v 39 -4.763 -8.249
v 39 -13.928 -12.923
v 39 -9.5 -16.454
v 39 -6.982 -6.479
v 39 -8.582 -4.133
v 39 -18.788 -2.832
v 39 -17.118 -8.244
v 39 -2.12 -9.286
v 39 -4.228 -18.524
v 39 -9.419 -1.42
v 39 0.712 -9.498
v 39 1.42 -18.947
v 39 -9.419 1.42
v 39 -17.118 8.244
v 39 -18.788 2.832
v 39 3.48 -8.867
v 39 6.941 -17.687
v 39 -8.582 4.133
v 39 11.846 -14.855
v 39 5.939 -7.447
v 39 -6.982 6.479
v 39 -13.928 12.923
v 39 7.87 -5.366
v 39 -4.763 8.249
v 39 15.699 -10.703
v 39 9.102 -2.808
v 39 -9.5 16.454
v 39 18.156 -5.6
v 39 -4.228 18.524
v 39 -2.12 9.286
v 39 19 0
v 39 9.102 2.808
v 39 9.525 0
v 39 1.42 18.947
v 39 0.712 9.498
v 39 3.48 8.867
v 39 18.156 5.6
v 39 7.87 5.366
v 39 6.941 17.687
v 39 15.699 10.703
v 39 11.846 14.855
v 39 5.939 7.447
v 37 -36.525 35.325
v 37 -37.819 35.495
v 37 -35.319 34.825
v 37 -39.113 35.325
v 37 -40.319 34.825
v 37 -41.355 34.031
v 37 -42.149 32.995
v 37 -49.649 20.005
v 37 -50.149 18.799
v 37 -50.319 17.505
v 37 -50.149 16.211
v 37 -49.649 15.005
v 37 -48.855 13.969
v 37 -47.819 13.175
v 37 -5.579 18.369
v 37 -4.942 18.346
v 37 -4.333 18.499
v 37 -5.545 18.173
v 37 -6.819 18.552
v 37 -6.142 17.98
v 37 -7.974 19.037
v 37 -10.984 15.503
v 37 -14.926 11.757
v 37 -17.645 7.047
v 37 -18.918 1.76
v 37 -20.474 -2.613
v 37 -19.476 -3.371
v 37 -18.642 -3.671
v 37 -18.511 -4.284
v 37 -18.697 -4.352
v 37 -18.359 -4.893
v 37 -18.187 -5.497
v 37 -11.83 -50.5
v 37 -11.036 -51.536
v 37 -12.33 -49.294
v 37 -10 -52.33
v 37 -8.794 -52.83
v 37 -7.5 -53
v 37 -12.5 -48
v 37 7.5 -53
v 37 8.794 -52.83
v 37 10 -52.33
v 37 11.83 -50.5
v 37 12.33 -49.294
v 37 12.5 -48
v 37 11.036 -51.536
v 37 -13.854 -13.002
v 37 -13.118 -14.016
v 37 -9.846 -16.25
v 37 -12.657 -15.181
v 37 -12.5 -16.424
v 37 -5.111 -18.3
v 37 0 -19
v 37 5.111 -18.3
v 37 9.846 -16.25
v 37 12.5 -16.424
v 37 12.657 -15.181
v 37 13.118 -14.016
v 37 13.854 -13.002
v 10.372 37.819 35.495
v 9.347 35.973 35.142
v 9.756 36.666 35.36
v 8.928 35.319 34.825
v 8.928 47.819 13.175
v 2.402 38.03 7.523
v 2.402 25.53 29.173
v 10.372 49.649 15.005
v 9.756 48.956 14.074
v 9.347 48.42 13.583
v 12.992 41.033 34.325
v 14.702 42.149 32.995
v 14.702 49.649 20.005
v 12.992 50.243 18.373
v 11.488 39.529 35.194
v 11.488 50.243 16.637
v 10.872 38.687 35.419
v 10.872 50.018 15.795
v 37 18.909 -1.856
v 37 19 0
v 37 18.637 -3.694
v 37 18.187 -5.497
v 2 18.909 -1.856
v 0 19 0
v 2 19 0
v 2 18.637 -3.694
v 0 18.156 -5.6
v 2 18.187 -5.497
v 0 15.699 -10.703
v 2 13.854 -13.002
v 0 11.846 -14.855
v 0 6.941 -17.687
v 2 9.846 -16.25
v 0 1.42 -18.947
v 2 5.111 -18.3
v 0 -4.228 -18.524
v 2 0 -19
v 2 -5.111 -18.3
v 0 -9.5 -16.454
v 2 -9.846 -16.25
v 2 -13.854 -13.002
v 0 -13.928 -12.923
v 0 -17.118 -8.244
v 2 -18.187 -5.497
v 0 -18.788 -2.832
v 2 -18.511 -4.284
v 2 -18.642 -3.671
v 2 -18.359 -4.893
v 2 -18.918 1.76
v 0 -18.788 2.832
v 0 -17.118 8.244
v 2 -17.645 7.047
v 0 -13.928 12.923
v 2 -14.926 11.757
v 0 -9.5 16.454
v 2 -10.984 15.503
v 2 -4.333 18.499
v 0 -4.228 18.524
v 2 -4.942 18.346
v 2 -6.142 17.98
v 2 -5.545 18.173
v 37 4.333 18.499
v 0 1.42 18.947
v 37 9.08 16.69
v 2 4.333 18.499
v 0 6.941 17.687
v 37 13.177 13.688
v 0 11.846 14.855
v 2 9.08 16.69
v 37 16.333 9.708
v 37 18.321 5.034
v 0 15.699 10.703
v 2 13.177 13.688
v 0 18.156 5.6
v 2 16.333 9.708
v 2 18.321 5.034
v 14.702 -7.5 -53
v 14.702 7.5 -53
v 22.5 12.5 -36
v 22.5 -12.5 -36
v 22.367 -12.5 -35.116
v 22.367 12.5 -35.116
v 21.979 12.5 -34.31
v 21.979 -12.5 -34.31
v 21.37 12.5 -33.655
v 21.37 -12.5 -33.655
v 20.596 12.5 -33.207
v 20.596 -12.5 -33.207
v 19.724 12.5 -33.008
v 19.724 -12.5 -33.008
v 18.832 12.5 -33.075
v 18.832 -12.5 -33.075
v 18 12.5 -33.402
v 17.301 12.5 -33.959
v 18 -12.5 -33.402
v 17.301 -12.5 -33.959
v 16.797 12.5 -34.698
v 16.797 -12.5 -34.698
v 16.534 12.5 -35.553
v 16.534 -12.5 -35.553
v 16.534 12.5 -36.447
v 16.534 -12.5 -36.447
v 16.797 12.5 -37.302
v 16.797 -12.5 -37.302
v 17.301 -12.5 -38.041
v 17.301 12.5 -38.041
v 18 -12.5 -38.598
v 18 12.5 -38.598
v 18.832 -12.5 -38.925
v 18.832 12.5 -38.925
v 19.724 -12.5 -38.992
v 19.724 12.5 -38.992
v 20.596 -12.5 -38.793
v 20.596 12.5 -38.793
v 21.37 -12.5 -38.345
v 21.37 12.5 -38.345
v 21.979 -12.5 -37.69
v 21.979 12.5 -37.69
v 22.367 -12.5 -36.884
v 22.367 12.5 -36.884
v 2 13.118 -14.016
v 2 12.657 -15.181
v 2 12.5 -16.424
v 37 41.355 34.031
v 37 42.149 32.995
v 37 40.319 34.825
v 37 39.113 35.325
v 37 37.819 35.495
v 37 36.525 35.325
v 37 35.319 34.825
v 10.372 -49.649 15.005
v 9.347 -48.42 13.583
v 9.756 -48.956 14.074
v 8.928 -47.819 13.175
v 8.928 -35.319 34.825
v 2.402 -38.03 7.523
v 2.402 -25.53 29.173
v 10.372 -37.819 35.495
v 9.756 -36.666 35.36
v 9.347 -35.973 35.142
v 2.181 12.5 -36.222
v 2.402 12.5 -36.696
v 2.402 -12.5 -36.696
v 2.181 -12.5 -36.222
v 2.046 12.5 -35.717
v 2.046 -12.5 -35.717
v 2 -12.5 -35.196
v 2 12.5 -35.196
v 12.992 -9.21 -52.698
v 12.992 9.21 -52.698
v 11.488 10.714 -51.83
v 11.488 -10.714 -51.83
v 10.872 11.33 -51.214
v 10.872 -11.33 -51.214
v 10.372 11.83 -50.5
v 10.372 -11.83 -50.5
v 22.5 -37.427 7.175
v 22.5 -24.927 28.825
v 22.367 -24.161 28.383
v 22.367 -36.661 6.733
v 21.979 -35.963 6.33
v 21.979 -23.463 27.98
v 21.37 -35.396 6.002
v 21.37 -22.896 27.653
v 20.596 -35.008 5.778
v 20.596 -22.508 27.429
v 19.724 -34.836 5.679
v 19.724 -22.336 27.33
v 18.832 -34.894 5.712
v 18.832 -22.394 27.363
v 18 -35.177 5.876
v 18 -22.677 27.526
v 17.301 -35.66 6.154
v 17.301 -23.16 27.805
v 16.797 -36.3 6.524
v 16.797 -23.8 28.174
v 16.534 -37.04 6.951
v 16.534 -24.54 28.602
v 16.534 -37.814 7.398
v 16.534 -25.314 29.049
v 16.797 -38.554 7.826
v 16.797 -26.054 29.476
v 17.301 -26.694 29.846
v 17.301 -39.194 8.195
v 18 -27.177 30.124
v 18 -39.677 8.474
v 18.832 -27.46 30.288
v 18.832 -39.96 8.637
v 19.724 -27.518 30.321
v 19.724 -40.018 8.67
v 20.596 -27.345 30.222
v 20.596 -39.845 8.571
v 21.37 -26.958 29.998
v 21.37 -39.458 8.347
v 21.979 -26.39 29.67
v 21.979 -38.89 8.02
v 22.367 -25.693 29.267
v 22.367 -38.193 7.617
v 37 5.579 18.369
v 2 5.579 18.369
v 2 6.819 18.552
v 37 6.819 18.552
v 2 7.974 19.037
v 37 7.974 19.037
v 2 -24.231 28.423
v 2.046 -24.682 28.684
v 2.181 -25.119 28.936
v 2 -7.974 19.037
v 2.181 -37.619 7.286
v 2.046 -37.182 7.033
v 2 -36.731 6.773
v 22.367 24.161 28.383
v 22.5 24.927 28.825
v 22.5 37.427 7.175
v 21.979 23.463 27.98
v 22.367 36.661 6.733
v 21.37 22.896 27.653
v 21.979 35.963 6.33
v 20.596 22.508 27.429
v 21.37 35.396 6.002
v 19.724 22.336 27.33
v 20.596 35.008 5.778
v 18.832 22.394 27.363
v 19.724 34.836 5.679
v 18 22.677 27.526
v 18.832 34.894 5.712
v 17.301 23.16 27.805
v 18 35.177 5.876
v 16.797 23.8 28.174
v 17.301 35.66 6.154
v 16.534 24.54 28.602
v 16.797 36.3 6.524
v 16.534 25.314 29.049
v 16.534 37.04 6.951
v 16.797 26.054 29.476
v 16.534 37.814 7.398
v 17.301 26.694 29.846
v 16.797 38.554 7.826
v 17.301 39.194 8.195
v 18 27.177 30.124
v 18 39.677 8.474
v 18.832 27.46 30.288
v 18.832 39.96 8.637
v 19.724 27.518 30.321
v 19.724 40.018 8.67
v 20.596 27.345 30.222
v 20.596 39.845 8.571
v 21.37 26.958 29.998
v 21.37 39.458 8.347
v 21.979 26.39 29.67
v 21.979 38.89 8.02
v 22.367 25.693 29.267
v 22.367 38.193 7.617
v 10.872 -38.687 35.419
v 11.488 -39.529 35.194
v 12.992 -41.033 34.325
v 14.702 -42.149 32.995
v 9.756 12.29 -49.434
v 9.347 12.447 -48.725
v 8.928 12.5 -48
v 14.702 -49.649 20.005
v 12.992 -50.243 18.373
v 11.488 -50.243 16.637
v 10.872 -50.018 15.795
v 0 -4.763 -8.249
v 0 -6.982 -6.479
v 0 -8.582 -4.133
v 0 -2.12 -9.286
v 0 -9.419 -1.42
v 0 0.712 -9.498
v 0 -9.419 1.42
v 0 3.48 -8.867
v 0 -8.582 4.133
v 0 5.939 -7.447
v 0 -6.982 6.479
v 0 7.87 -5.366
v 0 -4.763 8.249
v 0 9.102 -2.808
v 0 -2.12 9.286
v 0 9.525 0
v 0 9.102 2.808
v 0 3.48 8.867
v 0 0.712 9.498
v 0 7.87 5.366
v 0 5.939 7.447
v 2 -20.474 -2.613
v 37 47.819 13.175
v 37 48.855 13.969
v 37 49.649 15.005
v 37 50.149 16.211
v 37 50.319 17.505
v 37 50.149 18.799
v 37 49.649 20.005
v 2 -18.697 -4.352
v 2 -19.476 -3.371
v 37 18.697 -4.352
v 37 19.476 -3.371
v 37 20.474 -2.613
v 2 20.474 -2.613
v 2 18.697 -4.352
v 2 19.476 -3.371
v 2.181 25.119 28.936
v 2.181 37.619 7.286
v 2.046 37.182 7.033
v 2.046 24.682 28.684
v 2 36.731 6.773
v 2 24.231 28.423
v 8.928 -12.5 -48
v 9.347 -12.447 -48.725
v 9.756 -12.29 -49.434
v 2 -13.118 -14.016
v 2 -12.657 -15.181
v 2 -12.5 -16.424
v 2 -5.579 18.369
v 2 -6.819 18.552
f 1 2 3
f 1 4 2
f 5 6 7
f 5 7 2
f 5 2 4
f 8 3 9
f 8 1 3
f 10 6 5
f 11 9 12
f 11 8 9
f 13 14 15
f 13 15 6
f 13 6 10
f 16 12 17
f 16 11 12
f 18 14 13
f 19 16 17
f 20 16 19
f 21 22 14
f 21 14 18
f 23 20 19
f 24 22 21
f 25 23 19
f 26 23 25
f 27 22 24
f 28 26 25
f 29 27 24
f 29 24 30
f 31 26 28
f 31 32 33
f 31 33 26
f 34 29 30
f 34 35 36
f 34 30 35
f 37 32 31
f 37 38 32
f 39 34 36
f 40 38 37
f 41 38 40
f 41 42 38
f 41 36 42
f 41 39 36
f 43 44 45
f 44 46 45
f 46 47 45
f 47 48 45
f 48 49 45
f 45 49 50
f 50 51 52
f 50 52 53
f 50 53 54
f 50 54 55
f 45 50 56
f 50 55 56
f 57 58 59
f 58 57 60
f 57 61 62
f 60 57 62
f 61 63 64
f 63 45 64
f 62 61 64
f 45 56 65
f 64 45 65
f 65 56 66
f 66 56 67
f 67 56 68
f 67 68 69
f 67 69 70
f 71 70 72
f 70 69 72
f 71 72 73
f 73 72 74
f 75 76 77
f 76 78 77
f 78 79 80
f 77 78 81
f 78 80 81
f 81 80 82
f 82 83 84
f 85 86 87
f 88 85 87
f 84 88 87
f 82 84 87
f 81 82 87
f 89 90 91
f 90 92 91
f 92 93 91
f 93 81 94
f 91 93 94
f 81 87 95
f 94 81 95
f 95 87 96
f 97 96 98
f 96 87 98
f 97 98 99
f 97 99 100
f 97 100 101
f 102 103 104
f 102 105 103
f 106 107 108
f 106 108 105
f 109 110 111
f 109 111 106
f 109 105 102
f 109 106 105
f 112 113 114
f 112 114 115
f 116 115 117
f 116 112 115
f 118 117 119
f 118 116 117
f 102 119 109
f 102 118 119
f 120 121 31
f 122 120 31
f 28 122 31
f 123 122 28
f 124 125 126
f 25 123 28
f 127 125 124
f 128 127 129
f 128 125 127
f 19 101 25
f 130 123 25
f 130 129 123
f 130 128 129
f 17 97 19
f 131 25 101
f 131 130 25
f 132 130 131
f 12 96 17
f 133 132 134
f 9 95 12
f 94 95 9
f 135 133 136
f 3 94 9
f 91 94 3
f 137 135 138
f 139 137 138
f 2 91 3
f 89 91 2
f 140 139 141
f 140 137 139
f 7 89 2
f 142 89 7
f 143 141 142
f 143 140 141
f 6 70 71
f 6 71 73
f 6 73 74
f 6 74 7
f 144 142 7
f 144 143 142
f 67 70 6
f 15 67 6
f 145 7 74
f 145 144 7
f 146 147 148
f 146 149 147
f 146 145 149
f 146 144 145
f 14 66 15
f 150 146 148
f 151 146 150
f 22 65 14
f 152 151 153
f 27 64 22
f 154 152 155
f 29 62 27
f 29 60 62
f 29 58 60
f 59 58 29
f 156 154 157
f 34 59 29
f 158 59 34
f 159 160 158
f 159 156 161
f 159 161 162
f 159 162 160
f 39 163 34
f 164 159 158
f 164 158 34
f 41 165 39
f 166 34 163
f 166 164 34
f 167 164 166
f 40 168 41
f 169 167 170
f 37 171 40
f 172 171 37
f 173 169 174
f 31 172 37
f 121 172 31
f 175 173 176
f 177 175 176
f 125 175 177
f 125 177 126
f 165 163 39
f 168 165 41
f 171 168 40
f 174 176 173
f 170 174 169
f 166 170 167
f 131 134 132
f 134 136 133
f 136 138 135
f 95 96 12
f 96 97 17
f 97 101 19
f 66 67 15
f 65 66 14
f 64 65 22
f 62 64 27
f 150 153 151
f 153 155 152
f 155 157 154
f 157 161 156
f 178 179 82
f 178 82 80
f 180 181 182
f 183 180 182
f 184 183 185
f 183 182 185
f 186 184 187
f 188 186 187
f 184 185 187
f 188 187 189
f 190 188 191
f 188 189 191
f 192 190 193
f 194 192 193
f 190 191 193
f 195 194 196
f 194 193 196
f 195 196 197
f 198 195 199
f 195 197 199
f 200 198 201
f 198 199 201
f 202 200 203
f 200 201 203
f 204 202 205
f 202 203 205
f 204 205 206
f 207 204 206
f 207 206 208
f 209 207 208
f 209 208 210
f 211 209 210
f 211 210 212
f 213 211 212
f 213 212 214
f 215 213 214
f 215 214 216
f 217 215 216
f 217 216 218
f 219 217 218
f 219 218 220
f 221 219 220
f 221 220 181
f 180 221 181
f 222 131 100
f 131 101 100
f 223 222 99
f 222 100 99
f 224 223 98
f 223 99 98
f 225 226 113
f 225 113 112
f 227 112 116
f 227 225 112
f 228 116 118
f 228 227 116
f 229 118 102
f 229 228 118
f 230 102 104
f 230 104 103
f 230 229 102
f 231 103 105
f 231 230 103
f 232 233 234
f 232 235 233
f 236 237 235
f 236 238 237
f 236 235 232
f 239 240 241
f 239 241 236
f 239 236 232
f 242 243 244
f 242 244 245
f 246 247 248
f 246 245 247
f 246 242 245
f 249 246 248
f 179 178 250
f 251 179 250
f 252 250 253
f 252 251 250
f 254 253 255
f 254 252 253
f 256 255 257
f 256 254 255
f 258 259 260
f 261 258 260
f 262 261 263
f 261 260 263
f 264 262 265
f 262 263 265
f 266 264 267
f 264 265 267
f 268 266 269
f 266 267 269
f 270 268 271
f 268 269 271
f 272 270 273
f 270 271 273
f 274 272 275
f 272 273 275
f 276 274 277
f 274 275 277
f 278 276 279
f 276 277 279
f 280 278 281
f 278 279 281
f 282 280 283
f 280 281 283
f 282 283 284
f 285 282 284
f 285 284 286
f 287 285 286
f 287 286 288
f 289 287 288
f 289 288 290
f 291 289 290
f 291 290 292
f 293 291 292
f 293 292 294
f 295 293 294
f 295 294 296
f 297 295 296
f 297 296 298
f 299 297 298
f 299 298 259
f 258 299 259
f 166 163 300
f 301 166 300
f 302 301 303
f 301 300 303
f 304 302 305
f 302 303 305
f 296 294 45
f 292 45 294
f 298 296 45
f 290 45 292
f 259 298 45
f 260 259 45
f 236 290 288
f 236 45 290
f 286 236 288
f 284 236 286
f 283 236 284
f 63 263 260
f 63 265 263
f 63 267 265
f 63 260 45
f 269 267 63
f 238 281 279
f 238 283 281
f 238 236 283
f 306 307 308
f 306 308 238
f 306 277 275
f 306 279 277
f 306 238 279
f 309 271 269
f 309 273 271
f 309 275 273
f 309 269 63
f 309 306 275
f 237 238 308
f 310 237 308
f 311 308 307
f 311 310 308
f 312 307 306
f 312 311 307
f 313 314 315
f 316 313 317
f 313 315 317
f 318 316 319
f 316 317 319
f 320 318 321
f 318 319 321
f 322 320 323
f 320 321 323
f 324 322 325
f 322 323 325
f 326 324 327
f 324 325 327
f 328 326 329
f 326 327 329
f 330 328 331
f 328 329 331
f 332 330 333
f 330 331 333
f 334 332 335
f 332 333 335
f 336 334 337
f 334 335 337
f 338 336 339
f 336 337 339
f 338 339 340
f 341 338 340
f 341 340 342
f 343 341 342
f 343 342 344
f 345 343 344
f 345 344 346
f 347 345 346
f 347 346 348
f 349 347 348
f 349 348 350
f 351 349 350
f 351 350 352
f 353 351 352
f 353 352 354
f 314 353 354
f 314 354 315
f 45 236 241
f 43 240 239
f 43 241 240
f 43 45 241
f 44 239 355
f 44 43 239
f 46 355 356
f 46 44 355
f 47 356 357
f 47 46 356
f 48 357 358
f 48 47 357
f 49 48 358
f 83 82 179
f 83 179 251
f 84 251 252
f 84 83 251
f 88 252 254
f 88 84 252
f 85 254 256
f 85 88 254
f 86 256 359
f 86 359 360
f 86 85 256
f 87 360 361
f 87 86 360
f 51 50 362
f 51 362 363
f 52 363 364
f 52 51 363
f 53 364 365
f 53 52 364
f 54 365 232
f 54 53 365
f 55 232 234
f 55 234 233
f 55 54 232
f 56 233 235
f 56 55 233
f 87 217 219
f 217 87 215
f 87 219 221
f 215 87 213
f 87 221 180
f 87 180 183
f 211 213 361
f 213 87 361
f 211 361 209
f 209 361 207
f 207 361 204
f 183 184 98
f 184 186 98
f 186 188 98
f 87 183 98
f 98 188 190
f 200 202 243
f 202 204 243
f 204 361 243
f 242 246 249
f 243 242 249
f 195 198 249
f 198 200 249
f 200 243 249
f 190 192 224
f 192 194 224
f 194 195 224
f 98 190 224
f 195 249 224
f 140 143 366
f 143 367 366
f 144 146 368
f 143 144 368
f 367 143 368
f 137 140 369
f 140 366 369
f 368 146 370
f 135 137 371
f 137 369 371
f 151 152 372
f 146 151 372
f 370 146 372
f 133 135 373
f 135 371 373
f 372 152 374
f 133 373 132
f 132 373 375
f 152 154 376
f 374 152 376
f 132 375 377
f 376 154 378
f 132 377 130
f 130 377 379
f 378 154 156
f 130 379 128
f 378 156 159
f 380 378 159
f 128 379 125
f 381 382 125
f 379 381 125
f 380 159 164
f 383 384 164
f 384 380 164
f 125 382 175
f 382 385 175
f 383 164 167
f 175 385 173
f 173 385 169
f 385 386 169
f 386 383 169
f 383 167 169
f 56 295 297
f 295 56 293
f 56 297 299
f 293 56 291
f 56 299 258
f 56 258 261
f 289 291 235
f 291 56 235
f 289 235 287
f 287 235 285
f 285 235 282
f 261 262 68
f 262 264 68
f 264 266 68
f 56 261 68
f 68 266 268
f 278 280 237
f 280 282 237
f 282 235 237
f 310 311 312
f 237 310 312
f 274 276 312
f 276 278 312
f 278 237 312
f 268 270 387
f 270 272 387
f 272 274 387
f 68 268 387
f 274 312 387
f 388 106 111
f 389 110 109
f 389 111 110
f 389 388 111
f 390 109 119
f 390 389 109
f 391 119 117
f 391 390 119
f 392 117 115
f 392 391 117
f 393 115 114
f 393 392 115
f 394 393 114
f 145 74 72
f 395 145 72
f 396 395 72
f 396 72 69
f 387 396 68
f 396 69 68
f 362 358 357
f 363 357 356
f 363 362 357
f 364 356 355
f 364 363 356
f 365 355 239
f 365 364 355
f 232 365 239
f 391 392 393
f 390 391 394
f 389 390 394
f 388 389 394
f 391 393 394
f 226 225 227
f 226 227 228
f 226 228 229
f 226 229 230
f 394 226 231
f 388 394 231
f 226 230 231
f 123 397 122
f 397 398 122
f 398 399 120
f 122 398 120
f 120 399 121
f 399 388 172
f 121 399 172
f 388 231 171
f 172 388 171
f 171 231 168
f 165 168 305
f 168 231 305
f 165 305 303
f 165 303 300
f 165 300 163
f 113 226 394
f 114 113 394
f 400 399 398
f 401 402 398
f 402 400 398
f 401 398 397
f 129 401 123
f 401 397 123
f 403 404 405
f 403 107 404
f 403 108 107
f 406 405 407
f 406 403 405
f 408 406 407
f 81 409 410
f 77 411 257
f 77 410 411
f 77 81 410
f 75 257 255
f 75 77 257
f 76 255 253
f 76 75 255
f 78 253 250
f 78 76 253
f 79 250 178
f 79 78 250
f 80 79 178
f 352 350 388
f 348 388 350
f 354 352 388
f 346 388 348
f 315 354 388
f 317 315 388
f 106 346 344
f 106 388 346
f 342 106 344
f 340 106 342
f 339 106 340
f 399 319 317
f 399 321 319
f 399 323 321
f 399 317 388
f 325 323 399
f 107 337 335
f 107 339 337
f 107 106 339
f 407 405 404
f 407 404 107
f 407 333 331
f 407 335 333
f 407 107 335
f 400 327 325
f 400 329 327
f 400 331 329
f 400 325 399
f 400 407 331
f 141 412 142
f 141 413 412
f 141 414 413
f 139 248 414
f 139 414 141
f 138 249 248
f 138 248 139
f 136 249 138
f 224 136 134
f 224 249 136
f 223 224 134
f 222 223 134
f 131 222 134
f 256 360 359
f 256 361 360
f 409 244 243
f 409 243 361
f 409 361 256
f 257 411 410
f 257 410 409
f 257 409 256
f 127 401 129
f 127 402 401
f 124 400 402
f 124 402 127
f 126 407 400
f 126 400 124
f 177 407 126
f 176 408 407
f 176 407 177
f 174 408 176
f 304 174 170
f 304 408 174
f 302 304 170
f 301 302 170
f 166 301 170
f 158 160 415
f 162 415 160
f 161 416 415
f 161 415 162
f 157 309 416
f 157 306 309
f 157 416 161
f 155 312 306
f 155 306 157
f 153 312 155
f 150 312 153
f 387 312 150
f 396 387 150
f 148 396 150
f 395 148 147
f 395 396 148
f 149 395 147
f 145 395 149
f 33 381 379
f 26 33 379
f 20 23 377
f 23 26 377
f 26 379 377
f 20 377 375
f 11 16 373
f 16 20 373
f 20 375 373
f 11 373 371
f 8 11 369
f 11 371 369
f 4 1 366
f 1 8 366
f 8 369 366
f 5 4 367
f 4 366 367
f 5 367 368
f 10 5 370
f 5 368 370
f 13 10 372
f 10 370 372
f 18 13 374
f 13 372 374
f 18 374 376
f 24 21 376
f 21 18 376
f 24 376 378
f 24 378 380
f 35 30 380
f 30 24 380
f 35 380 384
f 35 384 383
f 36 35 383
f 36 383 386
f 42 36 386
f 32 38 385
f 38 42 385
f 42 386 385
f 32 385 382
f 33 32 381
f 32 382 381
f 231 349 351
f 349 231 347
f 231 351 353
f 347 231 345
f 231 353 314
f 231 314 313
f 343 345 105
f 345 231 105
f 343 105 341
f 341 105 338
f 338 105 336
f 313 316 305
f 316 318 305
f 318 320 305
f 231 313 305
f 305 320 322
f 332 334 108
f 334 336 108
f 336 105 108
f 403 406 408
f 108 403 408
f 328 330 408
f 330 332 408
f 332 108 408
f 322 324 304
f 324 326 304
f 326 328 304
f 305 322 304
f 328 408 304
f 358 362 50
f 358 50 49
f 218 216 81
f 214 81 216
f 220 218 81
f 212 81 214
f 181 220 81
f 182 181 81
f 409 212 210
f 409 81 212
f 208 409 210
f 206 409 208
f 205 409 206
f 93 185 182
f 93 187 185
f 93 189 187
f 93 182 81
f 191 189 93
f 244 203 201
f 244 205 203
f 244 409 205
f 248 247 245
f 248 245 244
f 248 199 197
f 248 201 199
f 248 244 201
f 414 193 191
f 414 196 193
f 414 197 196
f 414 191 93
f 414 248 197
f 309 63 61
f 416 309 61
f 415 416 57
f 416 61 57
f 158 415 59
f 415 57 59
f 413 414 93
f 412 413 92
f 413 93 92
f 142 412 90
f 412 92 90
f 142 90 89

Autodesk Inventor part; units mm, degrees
ref_plane "YZ Plane" through (0, 0, 0) normal (1, 0, 0) x (0, 1, 0)
ref_plane "XZ Plane" through (0, 0, 0) normal (0, 1, 0) x (-1, 0, 0)
sketch "Sketch1" plane through (0, 0, 0) normal (1, 0, 0) x (0, 1, 0)
  circle A0 centre (0, 0) radius 19
  circle A1 centre (0, 0) radius 9.525
  dimension "d0" = 38
  dimension "d1" = 19.05
extrude "Extrusion1" add sketch "Sketch1" along normal blind 39
ref_plane "Work Plane1" through (2, 0, 0) normal (-1, 0, 0) x (0, 0, 1)
sketch "Sketch3" plane through (2, 0, 0) normal (-1, 0, 0) x (0, 0, 1)
  line L0 (0, 0) -> (-53, 0) construction
  line L1 (-48, 12.5) -> (-14.3091, 12.5)
  line L2 (-48, -12.5) -> (-14.3091, -12.5)
  circle A0 centre (0, 0) radius 19 projected
  line L3 (-48, 12.5) -> (-53, 12.5)
  line L4 (-53, -12.5) -> (-48, -12.5)
  line L5 (-53, 12.5) -> (-53, -12.5)
  dimension "d14" = 25
extrude "Extrusion2" add sketch "Sketch3" against normal blind 35 contours L1 A0 L2 L4 L5 L3
sketch "Sketch4" plane through (2, -12.5, -48) normal (0, -1, 0) x (1, 0, 0)
  line L0 (-9.6665, 48) -> (46.4461, 48) construction
  line L1 (0, -5) -> (35, -5) projected
  circle A0 centre (17.5, 12) radius 3
  line L2 (17.5, 12) -> (-11.0793, 12) construction
  line L3 (0, 33.6909) -> (0, -5) projected
  line L4 (0, 12) -> (9.815, -5)
  line L5 (0, 12) -> (29, 12) construction
  line L6 (9.815, -5) -> (0, -5)
  line L7 (0, 12) -> (0, -5)
  point P0 (-2, 48)
  point P1 (0, 0)
  dimension "d19" = 6
  dimension "d22" = 60
extrude "Extrusion3" cut sketch "Sketch4" against normal blind 25
fillet "Fillet1" radius 5 5 edges at (11.815, 0, -53) (24.4075, 12.5, -53) (24.4075, -12.5, -53) (19.5, -12.5, -14.3091) (19.5, 12.5, -14.3091)
fillet "Fillet2" radius 3 1 edges at (2, 0, -36)
pattern_circular "Circular Pattern1" count 3 over 360 about axis through (0, 0, 0) along (1, 0, 0) of "Extrusion2", "Extrusion3", "Fillet1", "Fillet2"
thread "Thread1" size "M20x1.5" class "6H" standard "ANSI Metric M Profile" full length
properties part number "aranha"
